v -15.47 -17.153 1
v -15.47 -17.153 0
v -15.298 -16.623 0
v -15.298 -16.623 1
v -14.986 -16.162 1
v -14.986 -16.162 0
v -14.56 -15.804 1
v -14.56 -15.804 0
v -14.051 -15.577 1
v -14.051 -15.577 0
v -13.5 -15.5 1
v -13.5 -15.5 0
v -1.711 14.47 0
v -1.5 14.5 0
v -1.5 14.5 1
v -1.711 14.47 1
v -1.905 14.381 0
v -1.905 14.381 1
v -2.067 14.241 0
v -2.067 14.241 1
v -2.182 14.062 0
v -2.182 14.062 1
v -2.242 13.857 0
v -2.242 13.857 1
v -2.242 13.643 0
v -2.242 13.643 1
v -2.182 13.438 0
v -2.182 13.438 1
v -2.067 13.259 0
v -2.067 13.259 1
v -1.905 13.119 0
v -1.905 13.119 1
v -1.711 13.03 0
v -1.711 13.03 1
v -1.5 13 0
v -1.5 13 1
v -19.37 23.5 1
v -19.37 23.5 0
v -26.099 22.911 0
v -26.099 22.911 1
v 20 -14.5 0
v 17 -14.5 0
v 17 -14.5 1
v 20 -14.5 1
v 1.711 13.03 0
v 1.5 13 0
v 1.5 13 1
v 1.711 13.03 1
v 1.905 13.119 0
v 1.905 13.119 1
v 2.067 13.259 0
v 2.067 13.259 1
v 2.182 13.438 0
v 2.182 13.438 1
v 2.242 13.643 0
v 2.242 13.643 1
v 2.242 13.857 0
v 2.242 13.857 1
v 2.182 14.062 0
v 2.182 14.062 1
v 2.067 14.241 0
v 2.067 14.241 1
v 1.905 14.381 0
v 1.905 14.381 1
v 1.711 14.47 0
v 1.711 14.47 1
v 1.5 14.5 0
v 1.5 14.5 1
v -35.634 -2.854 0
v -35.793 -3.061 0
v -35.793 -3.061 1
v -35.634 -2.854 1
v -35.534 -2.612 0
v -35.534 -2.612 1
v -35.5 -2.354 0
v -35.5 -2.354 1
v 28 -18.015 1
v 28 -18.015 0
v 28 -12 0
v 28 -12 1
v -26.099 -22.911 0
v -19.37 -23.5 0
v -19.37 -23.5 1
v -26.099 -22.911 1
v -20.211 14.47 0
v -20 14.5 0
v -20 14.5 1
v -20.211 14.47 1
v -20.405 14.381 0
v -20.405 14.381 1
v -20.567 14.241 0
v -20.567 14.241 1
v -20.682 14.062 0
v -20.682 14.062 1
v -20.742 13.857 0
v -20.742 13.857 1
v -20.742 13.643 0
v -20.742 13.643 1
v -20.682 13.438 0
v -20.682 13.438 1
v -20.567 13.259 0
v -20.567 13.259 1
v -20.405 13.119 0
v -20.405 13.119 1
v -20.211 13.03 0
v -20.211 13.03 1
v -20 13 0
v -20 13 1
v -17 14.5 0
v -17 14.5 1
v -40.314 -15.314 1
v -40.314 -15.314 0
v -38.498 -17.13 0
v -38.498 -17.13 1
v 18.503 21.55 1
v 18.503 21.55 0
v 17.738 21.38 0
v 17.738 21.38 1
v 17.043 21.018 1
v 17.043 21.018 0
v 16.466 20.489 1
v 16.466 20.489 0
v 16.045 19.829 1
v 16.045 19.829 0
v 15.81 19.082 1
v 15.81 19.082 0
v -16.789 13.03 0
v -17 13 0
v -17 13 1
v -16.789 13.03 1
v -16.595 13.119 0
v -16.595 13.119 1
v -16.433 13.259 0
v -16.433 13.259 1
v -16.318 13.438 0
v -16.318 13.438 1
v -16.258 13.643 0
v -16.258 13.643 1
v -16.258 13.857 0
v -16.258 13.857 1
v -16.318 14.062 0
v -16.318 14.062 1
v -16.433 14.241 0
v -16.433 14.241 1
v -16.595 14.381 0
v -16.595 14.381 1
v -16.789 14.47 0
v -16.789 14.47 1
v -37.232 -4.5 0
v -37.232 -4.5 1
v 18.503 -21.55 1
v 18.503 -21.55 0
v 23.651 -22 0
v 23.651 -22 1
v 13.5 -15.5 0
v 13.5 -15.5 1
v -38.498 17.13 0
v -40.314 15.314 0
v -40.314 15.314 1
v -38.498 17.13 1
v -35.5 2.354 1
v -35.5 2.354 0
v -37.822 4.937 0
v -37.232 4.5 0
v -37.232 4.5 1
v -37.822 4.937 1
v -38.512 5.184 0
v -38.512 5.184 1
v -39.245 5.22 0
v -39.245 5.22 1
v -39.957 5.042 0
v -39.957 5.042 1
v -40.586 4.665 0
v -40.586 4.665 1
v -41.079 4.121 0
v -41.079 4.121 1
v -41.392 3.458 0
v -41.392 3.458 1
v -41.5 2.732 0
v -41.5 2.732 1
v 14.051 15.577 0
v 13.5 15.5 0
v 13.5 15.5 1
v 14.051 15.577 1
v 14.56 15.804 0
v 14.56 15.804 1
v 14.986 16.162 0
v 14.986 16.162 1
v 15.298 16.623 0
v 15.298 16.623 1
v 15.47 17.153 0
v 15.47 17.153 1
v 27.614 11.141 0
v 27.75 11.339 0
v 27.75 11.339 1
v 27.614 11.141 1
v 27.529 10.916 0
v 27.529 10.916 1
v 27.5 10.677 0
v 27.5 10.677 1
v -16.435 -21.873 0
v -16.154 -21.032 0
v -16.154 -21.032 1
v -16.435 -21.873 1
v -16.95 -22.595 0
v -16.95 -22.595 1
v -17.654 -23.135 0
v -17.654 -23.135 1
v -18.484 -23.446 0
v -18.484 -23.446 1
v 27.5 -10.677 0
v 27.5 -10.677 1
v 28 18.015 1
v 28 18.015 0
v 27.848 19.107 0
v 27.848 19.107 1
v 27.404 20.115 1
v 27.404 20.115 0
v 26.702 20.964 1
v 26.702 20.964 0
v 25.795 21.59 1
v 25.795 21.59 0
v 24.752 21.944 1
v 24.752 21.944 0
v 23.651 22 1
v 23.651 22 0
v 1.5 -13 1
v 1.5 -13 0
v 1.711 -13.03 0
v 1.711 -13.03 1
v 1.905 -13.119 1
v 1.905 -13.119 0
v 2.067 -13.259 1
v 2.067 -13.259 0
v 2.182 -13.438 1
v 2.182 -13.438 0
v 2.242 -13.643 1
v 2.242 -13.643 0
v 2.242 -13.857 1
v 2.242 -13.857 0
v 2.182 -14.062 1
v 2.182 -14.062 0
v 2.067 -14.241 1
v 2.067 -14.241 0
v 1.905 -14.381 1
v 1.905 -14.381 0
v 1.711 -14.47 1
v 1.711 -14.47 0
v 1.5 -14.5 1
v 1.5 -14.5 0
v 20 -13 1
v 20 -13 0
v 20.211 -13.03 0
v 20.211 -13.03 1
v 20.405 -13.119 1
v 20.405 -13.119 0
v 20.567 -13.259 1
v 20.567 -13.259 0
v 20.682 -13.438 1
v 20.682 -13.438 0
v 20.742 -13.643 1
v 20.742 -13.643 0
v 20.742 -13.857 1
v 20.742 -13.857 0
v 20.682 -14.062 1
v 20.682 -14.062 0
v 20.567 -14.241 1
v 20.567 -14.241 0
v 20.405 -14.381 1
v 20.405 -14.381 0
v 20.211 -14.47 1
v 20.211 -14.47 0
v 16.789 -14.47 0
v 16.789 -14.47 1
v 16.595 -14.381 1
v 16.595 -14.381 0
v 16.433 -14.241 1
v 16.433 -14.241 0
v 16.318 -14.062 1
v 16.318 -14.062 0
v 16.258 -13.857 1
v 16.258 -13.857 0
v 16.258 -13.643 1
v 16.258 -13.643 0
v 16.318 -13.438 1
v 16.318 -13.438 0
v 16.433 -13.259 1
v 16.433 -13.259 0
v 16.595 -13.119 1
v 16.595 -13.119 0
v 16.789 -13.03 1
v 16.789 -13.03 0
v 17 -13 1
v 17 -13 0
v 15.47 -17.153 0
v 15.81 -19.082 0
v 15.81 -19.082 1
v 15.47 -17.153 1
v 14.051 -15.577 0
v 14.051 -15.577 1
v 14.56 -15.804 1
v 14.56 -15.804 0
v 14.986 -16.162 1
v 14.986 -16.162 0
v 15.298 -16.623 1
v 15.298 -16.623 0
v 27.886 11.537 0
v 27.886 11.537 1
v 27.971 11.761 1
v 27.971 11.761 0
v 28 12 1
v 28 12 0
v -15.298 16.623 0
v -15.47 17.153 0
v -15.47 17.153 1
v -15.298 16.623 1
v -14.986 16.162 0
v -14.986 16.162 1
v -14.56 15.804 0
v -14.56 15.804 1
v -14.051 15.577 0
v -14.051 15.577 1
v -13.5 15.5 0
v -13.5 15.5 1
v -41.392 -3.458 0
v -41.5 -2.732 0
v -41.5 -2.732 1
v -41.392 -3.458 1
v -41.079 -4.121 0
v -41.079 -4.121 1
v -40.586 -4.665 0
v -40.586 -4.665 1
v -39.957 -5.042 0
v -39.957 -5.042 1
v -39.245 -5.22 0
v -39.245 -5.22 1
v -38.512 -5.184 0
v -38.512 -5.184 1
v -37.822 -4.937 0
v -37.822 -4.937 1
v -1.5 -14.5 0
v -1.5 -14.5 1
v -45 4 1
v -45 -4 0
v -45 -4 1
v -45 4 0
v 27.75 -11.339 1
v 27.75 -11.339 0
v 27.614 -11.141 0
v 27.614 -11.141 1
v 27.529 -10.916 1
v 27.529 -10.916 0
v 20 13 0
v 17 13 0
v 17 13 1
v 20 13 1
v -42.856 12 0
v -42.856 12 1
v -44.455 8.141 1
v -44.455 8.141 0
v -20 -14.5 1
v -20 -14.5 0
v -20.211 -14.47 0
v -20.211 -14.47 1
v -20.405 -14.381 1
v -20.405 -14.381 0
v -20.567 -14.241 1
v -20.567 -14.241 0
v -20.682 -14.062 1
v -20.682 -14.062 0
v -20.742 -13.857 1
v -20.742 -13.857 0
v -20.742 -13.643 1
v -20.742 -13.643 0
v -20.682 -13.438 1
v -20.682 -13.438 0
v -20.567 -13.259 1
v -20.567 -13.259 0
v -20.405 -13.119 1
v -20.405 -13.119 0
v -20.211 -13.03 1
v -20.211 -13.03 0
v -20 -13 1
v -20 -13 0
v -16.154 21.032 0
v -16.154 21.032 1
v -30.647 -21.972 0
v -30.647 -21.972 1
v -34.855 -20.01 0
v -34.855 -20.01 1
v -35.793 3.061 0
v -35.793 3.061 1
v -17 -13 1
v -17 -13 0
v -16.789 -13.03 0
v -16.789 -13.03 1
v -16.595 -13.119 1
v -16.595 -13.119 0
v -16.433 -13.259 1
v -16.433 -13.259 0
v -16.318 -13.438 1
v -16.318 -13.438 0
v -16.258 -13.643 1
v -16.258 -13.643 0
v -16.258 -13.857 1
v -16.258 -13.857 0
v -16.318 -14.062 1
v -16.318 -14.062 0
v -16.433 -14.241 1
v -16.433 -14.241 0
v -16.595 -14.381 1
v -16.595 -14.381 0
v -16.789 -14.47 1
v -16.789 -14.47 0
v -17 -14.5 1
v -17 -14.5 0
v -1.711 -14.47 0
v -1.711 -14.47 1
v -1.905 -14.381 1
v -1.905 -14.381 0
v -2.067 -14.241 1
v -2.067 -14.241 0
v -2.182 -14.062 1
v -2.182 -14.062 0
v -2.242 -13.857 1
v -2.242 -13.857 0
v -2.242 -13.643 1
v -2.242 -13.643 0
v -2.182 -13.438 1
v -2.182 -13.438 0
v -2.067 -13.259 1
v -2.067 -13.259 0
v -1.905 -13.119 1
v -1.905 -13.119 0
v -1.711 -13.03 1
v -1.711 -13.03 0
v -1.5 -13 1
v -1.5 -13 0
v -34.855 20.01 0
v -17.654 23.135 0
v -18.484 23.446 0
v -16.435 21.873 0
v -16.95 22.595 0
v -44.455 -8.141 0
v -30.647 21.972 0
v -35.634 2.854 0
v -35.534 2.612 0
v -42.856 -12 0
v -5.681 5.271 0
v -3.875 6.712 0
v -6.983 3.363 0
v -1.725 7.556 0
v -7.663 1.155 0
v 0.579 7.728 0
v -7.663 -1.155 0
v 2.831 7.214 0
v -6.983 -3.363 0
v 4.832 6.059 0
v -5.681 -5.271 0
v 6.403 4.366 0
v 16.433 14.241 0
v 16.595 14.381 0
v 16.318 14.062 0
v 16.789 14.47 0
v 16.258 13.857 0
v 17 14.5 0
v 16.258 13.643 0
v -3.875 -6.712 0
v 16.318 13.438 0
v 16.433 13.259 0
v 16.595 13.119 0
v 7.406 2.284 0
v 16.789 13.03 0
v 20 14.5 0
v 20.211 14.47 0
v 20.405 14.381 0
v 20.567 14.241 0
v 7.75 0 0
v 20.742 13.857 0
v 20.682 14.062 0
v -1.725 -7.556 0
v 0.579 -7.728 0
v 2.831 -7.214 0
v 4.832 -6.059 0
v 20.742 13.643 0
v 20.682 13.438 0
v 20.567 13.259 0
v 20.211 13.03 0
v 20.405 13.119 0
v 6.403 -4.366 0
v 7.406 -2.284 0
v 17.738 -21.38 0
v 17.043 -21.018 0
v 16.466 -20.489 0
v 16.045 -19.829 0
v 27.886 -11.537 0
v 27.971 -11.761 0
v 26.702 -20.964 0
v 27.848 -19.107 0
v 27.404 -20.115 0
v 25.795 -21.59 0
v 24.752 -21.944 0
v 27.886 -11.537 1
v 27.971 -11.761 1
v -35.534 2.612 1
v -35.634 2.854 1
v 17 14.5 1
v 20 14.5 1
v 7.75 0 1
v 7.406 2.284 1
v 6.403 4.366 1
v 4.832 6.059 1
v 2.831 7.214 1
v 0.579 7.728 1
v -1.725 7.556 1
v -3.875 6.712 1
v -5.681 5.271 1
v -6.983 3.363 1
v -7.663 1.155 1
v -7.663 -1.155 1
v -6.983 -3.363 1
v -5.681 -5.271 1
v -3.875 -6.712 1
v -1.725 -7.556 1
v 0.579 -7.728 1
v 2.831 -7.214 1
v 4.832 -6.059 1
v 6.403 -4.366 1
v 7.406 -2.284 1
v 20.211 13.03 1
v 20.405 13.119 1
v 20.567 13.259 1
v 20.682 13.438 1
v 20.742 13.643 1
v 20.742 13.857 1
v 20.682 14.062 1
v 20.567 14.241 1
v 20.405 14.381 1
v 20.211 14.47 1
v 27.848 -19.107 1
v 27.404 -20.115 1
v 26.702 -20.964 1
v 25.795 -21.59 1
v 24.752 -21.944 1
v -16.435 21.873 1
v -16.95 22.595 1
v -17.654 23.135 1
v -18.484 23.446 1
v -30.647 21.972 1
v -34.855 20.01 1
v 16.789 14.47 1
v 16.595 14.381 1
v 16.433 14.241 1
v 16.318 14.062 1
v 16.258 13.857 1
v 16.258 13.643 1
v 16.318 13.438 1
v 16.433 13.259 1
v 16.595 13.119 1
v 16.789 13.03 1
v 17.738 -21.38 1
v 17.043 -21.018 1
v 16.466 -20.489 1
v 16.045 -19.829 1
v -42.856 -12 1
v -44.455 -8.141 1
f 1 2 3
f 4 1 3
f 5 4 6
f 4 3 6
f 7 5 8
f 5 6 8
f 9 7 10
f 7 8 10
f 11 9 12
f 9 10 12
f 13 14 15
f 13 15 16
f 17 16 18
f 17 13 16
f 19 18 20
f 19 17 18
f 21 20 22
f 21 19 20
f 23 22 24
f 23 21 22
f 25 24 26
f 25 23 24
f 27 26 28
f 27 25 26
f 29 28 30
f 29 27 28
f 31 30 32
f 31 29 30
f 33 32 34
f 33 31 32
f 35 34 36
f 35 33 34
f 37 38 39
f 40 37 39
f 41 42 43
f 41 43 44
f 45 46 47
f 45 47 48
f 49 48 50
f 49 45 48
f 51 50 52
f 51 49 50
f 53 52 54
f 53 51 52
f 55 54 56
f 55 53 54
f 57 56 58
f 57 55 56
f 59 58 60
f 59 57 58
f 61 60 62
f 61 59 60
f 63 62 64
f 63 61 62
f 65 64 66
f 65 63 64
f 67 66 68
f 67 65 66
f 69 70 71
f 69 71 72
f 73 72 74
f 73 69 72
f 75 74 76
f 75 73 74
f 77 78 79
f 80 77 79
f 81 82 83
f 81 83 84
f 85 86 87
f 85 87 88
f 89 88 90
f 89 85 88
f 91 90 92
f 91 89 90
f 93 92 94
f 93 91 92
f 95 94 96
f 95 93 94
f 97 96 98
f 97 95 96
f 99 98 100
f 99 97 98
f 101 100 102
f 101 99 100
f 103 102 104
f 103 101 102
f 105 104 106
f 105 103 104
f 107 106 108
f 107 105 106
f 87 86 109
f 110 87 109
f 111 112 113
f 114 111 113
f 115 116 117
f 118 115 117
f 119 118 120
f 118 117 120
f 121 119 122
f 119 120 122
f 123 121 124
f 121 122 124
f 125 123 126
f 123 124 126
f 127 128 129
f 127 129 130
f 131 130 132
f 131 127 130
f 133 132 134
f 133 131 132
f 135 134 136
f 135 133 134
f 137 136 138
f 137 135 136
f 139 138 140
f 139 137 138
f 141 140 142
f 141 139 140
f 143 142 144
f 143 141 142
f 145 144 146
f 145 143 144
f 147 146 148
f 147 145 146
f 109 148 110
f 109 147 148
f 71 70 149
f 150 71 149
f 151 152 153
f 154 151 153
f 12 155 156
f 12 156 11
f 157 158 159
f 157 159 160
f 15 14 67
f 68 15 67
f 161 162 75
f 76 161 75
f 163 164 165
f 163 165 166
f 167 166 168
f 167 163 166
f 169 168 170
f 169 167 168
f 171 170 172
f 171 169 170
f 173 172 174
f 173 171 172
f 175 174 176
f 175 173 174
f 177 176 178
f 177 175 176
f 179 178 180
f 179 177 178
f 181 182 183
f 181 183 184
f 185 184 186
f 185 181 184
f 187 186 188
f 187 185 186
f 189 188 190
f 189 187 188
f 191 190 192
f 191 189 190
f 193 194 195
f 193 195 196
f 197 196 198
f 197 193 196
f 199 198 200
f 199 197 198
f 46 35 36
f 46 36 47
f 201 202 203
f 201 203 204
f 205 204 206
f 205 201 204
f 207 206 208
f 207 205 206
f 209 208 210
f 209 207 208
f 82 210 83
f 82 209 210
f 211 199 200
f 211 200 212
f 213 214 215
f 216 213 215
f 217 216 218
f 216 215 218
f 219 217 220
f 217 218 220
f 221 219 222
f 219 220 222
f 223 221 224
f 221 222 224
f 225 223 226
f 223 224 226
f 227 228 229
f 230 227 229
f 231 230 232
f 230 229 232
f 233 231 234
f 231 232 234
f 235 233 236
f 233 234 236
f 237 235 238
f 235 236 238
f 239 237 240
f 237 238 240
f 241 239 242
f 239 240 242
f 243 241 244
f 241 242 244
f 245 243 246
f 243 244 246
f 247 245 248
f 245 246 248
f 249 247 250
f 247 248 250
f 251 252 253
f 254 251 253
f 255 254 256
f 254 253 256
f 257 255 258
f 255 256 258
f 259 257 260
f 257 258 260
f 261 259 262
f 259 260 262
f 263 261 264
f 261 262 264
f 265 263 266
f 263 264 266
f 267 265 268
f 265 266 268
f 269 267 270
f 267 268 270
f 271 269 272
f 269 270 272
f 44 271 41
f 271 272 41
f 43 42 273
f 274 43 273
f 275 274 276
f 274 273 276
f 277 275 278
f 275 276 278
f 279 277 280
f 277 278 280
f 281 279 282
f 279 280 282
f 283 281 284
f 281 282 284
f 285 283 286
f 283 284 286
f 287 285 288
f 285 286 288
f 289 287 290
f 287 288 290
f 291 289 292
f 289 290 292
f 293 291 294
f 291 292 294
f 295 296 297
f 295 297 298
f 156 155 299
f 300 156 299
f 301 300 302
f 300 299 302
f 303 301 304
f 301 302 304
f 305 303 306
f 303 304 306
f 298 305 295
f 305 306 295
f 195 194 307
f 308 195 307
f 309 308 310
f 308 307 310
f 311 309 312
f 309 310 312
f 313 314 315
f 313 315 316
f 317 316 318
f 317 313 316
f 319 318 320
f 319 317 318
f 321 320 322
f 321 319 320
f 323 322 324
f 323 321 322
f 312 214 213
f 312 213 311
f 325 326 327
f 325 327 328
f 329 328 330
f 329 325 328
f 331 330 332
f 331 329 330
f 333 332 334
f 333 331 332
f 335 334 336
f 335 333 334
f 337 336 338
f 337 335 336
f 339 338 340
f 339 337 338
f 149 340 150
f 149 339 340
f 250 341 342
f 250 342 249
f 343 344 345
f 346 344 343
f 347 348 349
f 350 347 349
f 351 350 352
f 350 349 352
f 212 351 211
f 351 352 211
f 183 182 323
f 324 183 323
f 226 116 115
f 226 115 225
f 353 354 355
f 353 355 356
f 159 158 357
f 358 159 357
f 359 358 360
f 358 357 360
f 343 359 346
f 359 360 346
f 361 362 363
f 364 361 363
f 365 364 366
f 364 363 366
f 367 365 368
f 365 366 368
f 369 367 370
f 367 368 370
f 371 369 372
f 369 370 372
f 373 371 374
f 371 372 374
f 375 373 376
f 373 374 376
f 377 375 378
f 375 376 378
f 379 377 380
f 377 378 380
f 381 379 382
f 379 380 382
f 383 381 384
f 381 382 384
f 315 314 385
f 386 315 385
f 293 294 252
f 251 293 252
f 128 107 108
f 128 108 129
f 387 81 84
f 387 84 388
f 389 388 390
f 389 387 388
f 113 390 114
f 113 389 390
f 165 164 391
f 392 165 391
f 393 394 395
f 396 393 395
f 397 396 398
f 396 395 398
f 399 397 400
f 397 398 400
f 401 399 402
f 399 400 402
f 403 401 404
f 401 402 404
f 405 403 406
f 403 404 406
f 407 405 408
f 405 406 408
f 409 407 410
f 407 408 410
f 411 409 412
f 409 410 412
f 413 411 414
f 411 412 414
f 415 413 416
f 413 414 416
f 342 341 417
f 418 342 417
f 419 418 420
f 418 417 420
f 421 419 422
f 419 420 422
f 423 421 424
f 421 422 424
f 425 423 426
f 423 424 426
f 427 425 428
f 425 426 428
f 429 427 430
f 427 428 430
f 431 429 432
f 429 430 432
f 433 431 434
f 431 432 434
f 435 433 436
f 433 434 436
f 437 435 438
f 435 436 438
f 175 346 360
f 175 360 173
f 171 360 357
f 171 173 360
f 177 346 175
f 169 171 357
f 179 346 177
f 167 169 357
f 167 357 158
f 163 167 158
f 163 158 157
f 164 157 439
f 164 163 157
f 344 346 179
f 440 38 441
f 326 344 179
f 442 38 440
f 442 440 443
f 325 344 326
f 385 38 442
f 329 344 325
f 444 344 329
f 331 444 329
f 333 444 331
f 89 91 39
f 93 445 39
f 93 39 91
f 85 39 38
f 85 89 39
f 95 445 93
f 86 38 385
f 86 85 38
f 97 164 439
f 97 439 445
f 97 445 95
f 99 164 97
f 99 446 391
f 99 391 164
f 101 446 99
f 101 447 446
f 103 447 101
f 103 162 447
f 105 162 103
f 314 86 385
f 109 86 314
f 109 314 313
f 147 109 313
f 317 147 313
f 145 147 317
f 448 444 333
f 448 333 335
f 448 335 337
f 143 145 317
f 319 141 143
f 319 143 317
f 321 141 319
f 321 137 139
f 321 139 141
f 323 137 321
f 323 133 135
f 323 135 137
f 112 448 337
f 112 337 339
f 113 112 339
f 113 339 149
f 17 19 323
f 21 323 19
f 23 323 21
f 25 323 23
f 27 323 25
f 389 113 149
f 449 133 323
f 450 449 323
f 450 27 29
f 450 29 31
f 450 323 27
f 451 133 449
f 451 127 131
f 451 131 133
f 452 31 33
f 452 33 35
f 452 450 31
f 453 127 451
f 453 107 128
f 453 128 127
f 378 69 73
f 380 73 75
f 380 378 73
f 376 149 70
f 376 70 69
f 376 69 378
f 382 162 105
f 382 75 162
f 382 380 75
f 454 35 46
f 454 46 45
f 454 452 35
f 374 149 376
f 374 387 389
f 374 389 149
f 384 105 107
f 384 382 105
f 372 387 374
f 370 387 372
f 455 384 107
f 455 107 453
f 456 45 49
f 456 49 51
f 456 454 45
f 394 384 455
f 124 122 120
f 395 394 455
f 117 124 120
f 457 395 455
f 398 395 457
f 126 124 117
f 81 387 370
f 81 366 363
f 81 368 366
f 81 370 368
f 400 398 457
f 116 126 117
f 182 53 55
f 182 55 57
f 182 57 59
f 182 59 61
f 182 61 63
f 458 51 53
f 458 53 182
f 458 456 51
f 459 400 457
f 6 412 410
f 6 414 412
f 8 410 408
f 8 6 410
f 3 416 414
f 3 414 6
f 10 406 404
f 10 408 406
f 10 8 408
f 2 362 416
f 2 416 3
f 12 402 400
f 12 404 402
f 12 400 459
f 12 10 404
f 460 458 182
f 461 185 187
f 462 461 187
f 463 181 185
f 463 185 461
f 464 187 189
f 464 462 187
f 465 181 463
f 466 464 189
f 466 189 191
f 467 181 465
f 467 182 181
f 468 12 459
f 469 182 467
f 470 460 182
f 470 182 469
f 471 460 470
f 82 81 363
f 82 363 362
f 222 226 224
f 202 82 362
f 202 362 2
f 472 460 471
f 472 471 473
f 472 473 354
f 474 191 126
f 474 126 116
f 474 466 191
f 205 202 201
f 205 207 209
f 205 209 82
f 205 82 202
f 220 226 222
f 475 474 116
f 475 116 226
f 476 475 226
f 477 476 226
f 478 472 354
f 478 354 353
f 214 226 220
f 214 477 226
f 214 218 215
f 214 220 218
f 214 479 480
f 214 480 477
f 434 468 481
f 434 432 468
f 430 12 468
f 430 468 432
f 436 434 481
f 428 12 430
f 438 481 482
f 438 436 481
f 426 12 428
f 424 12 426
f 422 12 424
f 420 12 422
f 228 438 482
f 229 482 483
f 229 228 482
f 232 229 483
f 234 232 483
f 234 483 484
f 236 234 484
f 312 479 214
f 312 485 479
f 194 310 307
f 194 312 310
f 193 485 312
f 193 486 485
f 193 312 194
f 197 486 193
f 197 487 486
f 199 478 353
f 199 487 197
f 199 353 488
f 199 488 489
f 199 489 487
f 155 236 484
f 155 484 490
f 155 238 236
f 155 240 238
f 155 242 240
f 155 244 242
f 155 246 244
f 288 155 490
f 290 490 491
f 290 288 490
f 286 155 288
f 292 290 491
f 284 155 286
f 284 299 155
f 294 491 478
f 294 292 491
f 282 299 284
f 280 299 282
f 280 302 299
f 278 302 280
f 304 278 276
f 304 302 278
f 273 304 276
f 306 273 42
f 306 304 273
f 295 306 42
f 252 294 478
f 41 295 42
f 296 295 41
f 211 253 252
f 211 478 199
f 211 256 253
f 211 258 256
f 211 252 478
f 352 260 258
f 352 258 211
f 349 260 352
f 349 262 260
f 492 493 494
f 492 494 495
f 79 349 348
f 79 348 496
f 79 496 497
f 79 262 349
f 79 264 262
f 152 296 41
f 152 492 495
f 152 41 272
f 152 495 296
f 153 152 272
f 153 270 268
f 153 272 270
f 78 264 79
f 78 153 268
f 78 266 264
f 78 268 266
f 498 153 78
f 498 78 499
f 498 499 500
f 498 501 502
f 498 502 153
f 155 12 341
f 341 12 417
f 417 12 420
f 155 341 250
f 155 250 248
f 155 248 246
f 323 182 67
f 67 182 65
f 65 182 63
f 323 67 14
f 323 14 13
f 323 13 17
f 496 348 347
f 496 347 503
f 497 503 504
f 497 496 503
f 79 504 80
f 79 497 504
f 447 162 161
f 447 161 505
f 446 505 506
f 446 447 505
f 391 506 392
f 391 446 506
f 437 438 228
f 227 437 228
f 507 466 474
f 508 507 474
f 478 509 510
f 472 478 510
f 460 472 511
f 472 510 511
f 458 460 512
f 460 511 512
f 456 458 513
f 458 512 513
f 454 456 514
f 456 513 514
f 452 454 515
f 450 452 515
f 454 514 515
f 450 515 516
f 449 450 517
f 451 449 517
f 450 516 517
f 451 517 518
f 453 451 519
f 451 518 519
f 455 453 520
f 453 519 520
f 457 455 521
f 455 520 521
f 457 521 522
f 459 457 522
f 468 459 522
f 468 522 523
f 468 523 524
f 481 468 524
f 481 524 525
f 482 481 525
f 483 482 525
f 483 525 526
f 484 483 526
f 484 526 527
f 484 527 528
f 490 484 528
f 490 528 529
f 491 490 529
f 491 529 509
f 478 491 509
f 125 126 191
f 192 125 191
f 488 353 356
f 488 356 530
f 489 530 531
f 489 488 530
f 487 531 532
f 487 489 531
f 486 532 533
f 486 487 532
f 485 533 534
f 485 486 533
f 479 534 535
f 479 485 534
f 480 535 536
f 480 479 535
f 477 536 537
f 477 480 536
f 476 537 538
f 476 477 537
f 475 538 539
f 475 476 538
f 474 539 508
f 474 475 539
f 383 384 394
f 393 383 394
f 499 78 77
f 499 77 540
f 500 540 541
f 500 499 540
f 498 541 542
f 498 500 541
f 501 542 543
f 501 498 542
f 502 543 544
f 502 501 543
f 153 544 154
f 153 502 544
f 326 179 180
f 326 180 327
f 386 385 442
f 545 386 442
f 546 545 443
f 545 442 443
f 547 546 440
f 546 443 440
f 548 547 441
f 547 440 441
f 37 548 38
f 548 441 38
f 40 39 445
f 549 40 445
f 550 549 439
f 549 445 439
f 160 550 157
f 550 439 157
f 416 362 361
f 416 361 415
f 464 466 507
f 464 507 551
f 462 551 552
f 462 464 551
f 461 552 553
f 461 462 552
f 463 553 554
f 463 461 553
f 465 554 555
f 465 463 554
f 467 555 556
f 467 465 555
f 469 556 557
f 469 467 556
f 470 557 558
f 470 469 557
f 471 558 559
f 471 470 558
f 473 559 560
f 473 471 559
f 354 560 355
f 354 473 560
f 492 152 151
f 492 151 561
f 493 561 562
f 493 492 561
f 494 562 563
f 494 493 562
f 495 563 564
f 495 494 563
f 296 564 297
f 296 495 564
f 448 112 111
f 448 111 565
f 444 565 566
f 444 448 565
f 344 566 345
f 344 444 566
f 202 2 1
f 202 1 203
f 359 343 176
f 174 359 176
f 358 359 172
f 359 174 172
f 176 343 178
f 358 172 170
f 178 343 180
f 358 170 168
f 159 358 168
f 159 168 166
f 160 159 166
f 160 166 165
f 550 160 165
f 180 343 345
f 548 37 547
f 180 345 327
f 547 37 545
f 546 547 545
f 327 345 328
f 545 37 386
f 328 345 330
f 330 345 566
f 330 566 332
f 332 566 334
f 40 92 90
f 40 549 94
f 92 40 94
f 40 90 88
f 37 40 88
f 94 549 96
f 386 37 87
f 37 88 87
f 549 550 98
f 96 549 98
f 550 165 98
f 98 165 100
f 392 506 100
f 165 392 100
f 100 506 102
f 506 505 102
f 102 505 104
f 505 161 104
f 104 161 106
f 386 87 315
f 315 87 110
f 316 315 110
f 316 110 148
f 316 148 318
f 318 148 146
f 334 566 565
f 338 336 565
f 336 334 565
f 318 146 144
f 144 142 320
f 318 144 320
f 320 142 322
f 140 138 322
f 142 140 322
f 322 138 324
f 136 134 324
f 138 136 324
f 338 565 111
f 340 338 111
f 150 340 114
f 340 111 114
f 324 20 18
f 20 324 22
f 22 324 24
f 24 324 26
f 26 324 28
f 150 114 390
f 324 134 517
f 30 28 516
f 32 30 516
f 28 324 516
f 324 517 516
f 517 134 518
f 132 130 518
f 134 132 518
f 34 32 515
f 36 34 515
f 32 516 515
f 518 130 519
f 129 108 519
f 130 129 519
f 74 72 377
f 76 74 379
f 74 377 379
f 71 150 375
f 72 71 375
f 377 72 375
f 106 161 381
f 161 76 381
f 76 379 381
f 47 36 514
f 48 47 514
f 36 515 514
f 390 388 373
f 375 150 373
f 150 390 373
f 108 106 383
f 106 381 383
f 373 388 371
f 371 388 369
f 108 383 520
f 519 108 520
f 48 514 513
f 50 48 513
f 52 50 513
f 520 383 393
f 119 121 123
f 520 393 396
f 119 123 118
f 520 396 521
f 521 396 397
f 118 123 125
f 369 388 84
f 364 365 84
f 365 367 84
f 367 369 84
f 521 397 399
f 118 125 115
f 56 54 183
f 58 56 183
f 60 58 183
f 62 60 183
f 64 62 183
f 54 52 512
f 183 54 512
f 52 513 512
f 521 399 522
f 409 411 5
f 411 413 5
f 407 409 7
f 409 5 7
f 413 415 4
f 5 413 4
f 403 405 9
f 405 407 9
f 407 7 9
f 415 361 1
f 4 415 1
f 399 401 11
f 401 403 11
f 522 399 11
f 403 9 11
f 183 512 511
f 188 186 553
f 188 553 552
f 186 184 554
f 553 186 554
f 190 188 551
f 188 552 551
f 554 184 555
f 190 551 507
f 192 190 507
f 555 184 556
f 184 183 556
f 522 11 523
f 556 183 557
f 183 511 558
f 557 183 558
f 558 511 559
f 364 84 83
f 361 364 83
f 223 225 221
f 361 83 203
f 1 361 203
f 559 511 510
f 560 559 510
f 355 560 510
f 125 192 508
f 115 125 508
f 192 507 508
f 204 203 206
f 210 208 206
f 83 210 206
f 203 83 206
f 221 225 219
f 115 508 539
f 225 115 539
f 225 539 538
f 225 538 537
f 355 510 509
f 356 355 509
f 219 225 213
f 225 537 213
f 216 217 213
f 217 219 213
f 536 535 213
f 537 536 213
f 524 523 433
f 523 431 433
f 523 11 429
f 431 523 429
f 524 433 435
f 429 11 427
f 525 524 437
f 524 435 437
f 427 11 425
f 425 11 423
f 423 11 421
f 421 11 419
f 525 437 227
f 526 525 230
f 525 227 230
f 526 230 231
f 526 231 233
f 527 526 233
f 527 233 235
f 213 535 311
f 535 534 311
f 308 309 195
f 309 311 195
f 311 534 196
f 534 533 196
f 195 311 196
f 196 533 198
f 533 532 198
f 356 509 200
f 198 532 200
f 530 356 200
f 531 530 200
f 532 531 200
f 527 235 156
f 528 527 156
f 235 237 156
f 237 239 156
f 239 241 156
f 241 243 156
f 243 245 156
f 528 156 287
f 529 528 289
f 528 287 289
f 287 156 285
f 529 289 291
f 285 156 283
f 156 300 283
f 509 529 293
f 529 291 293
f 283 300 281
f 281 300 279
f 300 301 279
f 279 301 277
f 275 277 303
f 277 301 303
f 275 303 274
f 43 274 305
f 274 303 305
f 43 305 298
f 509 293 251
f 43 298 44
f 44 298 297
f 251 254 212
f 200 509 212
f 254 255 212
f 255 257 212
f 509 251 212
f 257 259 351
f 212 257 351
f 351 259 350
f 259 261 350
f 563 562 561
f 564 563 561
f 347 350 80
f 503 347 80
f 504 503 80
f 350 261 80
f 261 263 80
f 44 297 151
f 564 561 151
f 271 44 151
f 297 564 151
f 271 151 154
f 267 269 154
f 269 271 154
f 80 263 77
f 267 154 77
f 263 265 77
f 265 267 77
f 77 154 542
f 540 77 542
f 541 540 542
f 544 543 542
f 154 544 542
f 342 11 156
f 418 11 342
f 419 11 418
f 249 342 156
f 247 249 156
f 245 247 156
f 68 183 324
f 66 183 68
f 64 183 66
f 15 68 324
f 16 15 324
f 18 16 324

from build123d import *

# Parameters (mm, degrees)
PAD_DEPTH       = 1
SKETCH_R        = 7.75
POCKET_DEPTH    = 1.001
POCKET001_DEPTH = 1.001


with BuildPart() as part:
    # Sketch007 → Pad (new body)
    with BuildSketch(Plane.XY):
        with BuildLine():
            Line((13.5, 15.5), (-13.5, 15.5))
            ThreePointArc((-15.469616, 17.152704), (-14.785575, 15.967911), (-13.5, 15.5))
            Line((-15.469616, 17.152704), (-16.153704, 21.03236))
            ThreePointArc((-16.153704, 21.03236), (-17.281843, 22.891476), (-19.369594, 23.5))
            Line((-19.369594, 23.5), (-26.098892, 22.911263))
            ThreePointArc((-26.098892, 22.911263), (-32.808142, 21.113525), (-38.497913, 17.129504))
            Line((-40.313708, 15.313708), (-38.497913, 17.129504))
            ThreePointArc((-40.313708, 15.313708), (-43.782073, 10.122935), (-45, 4))
            Line((-45, 4), (-45, 0))
            Line((-45, 0), (27.5, 0))
            Line((27.5, 0), (27.5, 10.677124))
            ThreePointArc((27.75, 11.338562), (27.564586, 11.030678), (27.5, 10.677124))
            ThreePointArc((27.75, 11.338562), (27.935414, 11.646447), (28, 12))
            Line((28, 18.015221), (28, 12))
            ThreePointArc((28, 18.015221), (26.702361, 20.964331), (23.651377, 22))
            Line((18.502743, 21.549553), (23.651377, 22))
            ThreePointArc((18.502743, 21.549553), (16.73744, 20.772801), (15.809787, 19.081913))
            Line((15.809787, 19.081913), (15.469616, 17.152704))
            ThreePointArc((13.5, 15.5), (14.785575, 15.967911), (15.469616, 17.152704))
        make_face()
        with BuildLine():
            Line((-20, 13), (-17, 13))
            ThreePointArc((-17, 13), (-16.25, 13.75), (-17, 14.5))
            Line((-20, 14.5), (-17, 14.5))
            ThreePointArc((-20, 14.5), (-20.75, 13.75), (-20, 13))
        make_face(mode=Mode.SUBTRACT)
        with BuildLine():
            Line((-1.5, 13), (1.5, 13))
            ThreePointArc((1.5, 13), (2.25, 13.75), (1.5, 14.5))
            Line((-1.5, 14.5), (1.5, 14.5))
            ThreePointArc((-1.5, 14.5), (-2.25, 13.75), (-1.5, 13))
        make_face(mode=Mode.SUBTRACT)
        with BuildLine():
            Line((17, 13), (20, 13))
            ThreePointArc((20, 13), (20.75, 13.75), (20, 14.5))
            Line((17, 14.5), (20, 14.5))
            ThreePointArc((17, 14.5), (16.25, 13.75), (17, 13))
        make_face(mode=Mode.SUBTRACT)
    pad = extrude(amount=PAD_DEPTH)

    # Mirrored: Pad across Sketch007 H_Axis
    add(pad.mirror(Plane.ZX))

    # Sketch (on Face5 of Mirrored) → Pocket (cut, through all)
    with BuildSketch(Plane.XY.offset(1)):
        Circle(SKETCH_R)
    extrude(amount=-POCKET_DEPTH, mode=Mode.SUBTRACT)

    # Sketch008 → Pocket001 (cut, through all)
    with BuildSketch(Plane.XY):
        with BuildLine():
            Line((-41.5, 2.732233), (-41.5, -2.732233))
            ThreePointArc((-41.5, -2.732233), (-39.956709, -5.041932), (-37.232233, -4.5))
            Line((-35.792893, -3.06066), (-37.232233, -4.5))
            ThreePointArc((-35.792893, -3.06066), (-35.57612, -2.736237), (-35.5, -2.353553))
            Line((-35.5, 2.353553), (-35.5, -2.353553))
            ThreePointArc((-35.5, 2.353553), (-35.57612, 2.736237), (-35.792893, 3.06066))
            Line((-37.232233, 4.5), (-35.792893, 3.06066))
            ThreePointArc((-37.232233, 4.5), (-39.956709, 5.041932), (-41.5, 2.732233))
        make_face()
    extrude(amount=POCKET001_DEPTH, mode=Mode.SUBTRACT)


solid = part.part
